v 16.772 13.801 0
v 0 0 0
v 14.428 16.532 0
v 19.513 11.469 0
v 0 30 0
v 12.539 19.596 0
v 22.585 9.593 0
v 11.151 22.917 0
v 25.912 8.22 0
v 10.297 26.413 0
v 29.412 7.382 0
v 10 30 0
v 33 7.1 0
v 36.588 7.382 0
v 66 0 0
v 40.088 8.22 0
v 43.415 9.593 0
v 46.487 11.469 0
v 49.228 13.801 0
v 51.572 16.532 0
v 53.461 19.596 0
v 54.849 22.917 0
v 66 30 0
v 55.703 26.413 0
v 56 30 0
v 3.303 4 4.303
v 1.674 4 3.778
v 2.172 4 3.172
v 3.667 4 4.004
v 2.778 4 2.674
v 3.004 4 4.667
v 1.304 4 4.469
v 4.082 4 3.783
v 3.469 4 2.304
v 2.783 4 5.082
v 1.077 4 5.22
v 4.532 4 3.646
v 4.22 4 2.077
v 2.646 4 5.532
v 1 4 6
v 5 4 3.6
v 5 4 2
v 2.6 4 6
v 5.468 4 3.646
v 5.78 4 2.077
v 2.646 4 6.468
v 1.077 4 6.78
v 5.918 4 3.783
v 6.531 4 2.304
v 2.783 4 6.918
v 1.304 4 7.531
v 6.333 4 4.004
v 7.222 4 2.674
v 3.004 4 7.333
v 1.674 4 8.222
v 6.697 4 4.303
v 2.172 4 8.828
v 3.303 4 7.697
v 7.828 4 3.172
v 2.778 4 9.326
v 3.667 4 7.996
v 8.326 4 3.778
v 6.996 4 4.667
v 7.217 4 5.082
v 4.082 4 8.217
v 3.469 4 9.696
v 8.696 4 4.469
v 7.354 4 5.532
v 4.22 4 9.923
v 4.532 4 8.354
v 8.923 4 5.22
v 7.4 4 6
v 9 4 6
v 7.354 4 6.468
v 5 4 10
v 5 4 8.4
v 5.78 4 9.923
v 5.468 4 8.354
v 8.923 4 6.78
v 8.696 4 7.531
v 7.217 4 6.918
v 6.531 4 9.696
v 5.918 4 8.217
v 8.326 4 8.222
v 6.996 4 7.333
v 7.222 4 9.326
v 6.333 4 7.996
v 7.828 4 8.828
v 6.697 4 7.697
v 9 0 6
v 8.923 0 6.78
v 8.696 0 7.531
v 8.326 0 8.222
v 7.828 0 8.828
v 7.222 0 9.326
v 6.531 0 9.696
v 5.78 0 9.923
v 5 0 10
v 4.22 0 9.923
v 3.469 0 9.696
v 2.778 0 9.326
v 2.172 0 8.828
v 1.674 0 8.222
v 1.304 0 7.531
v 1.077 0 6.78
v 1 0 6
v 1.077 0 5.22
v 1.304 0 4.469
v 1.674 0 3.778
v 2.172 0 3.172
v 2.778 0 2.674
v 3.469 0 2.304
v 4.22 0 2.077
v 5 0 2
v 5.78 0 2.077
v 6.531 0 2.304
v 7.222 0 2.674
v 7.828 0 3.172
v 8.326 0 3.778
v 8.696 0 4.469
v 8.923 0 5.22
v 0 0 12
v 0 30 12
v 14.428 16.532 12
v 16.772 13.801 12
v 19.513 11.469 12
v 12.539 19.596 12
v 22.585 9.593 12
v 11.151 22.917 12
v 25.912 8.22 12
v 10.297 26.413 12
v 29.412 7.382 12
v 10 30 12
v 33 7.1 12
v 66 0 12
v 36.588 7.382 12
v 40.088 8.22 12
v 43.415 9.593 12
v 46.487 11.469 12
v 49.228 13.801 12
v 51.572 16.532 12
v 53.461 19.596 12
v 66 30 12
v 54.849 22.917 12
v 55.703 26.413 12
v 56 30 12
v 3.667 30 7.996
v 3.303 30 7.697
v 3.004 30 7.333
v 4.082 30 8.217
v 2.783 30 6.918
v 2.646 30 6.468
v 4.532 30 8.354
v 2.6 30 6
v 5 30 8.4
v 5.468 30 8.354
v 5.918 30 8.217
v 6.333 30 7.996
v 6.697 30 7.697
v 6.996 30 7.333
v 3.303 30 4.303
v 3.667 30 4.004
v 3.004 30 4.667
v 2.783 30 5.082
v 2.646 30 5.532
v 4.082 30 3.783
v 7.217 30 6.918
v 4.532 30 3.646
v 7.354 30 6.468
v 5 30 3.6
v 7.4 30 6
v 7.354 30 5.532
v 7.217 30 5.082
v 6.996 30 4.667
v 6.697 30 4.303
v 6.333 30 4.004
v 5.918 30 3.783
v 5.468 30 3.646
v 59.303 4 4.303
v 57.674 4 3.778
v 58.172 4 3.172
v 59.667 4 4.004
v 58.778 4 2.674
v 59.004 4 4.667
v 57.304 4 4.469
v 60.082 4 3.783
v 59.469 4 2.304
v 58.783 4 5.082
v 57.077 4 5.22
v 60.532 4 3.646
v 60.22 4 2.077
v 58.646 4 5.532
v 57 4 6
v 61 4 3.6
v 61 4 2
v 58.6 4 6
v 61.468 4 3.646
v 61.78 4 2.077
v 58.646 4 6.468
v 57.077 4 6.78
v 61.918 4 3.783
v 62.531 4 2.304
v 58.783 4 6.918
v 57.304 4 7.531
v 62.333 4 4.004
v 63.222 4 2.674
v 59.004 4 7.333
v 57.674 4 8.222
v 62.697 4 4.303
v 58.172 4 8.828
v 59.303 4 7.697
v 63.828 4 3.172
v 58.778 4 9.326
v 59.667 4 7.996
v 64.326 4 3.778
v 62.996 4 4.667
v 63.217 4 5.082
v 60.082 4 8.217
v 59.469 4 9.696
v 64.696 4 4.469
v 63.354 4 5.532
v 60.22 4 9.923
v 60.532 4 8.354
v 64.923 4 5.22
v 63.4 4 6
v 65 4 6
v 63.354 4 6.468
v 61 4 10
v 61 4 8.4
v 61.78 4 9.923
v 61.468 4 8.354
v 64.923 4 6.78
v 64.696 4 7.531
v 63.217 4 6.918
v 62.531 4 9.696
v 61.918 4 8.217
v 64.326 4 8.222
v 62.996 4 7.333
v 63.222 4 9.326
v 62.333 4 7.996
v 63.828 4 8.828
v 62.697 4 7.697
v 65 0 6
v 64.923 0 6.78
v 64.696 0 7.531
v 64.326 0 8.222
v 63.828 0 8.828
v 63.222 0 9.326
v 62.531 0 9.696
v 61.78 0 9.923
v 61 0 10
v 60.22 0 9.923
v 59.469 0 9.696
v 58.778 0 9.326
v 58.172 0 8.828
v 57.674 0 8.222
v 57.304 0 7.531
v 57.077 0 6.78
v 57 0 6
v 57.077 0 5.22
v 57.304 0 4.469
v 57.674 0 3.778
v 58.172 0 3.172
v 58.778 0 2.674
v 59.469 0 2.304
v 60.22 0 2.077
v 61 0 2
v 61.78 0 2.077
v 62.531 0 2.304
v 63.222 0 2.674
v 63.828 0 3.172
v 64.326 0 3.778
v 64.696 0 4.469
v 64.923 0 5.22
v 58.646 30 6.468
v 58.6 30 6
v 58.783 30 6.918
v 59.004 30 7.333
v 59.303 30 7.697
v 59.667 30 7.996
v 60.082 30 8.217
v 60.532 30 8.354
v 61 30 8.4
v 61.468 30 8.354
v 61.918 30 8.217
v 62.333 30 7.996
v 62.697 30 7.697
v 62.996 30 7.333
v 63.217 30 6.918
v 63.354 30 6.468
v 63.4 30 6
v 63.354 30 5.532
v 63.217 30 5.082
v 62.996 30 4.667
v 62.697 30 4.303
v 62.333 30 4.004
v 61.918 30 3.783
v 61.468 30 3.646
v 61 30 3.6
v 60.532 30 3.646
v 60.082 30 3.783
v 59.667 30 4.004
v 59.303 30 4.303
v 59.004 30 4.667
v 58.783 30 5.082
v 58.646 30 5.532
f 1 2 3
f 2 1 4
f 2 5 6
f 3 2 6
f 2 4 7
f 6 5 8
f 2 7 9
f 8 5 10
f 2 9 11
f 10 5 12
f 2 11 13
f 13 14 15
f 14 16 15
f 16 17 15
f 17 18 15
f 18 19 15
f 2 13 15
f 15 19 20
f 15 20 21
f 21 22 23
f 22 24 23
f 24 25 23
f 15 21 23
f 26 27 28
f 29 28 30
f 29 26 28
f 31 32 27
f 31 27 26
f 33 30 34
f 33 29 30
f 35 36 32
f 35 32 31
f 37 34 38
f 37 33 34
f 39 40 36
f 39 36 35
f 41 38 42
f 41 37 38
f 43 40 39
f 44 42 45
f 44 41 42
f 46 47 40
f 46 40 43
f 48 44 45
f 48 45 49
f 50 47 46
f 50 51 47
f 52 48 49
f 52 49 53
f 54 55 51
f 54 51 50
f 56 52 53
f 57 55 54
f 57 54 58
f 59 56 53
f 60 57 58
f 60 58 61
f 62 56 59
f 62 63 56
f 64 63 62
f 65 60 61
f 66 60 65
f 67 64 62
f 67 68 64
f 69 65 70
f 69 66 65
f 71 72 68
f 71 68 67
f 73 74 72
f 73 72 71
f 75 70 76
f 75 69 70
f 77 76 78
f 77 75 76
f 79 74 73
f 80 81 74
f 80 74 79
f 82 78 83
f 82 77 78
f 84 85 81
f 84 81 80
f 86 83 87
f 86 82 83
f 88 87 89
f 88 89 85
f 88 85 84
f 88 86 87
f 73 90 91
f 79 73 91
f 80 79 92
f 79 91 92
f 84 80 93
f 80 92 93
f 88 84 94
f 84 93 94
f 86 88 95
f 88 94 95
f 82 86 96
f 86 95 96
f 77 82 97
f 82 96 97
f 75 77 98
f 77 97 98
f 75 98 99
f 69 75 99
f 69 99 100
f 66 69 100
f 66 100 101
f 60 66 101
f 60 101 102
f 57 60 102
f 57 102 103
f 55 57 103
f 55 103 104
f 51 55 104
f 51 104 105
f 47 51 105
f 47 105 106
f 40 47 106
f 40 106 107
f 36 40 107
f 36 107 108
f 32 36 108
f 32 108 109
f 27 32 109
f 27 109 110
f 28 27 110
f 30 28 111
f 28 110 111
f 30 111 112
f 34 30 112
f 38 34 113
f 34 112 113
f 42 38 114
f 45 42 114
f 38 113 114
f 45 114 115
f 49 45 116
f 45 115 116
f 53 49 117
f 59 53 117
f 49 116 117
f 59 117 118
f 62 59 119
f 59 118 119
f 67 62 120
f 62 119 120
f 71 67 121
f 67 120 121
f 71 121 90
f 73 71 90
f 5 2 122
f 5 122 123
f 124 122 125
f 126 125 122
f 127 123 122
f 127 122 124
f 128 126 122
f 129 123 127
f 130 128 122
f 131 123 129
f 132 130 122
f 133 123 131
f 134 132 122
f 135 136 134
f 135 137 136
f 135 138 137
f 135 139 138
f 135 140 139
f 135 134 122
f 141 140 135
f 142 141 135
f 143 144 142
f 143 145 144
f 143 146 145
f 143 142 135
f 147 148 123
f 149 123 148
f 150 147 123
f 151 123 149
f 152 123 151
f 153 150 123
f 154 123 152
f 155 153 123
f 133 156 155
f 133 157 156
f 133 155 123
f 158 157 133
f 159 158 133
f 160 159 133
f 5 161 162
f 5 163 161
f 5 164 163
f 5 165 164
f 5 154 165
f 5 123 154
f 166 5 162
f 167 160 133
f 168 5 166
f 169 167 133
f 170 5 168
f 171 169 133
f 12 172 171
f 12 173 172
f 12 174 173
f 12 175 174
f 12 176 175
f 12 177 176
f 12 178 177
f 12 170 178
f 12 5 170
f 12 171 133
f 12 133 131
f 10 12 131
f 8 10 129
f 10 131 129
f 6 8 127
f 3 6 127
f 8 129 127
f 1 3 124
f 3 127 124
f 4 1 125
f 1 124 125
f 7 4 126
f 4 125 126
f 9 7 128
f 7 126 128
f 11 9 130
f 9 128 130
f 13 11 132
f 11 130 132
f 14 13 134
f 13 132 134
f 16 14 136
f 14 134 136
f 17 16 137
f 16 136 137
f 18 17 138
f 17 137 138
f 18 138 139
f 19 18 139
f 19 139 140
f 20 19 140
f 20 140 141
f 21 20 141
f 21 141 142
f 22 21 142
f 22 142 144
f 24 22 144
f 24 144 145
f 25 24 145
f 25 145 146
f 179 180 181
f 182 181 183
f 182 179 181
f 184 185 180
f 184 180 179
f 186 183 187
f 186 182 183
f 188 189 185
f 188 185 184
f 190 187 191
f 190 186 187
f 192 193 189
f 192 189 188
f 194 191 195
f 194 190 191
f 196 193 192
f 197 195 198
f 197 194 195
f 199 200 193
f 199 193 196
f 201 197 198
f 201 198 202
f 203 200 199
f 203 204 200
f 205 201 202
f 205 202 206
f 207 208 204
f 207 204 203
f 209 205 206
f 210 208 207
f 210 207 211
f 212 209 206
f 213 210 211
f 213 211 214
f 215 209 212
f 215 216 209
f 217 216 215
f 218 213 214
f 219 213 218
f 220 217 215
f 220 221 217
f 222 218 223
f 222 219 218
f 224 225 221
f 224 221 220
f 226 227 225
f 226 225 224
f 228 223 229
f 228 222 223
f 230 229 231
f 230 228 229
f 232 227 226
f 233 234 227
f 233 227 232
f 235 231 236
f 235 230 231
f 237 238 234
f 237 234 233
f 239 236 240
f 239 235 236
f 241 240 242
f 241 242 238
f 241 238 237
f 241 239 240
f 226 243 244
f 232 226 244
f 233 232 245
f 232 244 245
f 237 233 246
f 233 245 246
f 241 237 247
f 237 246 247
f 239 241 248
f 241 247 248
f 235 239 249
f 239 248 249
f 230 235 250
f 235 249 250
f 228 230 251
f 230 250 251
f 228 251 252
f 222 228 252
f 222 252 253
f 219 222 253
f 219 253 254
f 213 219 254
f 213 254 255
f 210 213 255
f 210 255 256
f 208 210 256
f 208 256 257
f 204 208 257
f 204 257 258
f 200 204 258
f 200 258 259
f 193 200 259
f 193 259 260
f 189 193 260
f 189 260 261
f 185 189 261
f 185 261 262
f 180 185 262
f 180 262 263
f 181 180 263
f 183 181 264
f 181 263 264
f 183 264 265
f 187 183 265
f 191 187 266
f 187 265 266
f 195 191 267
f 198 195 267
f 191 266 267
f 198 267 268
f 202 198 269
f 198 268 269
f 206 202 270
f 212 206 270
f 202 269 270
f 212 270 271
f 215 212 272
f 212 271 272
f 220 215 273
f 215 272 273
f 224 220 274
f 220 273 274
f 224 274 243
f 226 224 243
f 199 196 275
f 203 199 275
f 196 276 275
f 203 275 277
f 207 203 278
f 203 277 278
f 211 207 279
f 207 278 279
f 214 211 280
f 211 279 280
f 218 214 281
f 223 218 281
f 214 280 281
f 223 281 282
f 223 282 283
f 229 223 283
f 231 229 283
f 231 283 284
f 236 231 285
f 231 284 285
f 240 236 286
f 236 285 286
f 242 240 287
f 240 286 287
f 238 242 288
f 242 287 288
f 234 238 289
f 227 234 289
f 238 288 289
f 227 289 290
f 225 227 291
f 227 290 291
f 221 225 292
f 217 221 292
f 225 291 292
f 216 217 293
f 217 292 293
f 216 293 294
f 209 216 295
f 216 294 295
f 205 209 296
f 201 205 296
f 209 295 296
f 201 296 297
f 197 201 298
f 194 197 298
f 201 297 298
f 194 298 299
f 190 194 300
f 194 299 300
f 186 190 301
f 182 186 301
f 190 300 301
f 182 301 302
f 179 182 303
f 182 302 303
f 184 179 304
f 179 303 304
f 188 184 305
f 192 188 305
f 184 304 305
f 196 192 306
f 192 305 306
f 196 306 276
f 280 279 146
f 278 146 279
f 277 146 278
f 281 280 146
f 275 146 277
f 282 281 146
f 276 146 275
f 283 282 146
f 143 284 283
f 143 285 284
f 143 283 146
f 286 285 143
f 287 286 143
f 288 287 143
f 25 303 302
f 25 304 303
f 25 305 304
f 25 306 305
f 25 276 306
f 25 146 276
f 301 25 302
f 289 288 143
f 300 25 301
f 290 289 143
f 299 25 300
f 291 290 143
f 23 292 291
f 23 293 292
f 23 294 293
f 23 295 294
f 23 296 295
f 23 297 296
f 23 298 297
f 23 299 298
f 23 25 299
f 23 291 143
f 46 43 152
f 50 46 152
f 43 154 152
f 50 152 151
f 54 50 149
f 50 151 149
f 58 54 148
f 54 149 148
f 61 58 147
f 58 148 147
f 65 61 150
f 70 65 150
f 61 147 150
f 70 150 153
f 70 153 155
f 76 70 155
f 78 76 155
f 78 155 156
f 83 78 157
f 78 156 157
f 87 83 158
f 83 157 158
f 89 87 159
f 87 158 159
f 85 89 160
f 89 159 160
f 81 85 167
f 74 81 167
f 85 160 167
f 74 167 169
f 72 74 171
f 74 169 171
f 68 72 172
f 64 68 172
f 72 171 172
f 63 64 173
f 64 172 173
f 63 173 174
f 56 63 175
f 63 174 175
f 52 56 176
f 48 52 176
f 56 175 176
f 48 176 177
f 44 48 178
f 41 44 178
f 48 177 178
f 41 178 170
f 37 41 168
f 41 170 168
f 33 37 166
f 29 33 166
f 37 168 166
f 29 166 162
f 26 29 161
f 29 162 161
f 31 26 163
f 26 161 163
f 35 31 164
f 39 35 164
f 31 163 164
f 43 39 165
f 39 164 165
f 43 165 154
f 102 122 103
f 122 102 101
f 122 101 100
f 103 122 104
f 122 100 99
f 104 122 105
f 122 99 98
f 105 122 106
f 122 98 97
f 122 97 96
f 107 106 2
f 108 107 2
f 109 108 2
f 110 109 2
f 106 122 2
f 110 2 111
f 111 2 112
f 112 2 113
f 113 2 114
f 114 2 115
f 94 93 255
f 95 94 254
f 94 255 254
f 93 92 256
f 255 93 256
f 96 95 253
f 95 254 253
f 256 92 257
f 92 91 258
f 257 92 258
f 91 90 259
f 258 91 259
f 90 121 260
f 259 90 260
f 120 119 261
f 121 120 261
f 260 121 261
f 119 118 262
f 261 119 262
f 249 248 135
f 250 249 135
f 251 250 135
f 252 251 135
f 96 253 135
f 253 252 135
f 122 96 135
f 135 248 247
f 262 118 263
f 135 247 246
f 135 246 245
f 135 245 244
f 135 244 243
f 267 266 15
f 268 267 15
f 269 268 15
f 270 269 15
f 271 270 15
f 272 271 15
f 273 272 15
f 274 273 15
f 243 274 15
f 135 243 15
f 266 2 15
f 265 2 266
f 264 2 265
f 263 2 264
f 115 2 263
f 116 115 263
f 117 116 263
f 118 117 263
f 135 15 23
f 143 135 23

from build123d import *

# Parameters (mm, degrees)
SKETCH_1_W                   = 66
SKETCH_1_H                   = 30
EXTRUDE_1_DEPTH              = 12
SKETCH_2_R                   = 23
CUT_EXTRUDE_1_DEPTH          = 74.484692283
HOLE_WIZARD_M4_1_D           = 4.8
HOLE_WIZARD_M4_1_CBORE_D     = 8
HOLE_WIZARD_M4_1_CBORE_DEPTH = 4


with BuildPart() as part:
    # 草图1 → 凸台-拉伸1 (new body)
    with BuildSketch(Plane.XY):
        with Locations((33, 15)):
            Rectangle(SKETCH_1_W, SKETCH_1_H)
    extrude(amount=EXTRUDE_1_DEPTH)

    # 草图2 → 切除-拉伸1 (cut, through all)
    with BuildSketch(Plane.XY.offset(12)):
        with Locations((33, 30.1)):
            Circle(SKETCH_2_R)
    extrude(amount=-CUT_EXTRUDE_1_DEPTH, mode=Mode.SUBTRACT)

    # M4 六角凹头螺钉的柱形沉头孔1 (through all)
    with Locations(Plane.XZ):
        with Locations((61, 6), (5, 6)):
            CounterBoreHole(HOLE_WIZARD_M4_1_D / 2, HOLE_WIZARD_M4_1_CBORE_D / 2, HOLE_WIZARD_M4_1_CBORE_DEPTH)


solid = part.part
